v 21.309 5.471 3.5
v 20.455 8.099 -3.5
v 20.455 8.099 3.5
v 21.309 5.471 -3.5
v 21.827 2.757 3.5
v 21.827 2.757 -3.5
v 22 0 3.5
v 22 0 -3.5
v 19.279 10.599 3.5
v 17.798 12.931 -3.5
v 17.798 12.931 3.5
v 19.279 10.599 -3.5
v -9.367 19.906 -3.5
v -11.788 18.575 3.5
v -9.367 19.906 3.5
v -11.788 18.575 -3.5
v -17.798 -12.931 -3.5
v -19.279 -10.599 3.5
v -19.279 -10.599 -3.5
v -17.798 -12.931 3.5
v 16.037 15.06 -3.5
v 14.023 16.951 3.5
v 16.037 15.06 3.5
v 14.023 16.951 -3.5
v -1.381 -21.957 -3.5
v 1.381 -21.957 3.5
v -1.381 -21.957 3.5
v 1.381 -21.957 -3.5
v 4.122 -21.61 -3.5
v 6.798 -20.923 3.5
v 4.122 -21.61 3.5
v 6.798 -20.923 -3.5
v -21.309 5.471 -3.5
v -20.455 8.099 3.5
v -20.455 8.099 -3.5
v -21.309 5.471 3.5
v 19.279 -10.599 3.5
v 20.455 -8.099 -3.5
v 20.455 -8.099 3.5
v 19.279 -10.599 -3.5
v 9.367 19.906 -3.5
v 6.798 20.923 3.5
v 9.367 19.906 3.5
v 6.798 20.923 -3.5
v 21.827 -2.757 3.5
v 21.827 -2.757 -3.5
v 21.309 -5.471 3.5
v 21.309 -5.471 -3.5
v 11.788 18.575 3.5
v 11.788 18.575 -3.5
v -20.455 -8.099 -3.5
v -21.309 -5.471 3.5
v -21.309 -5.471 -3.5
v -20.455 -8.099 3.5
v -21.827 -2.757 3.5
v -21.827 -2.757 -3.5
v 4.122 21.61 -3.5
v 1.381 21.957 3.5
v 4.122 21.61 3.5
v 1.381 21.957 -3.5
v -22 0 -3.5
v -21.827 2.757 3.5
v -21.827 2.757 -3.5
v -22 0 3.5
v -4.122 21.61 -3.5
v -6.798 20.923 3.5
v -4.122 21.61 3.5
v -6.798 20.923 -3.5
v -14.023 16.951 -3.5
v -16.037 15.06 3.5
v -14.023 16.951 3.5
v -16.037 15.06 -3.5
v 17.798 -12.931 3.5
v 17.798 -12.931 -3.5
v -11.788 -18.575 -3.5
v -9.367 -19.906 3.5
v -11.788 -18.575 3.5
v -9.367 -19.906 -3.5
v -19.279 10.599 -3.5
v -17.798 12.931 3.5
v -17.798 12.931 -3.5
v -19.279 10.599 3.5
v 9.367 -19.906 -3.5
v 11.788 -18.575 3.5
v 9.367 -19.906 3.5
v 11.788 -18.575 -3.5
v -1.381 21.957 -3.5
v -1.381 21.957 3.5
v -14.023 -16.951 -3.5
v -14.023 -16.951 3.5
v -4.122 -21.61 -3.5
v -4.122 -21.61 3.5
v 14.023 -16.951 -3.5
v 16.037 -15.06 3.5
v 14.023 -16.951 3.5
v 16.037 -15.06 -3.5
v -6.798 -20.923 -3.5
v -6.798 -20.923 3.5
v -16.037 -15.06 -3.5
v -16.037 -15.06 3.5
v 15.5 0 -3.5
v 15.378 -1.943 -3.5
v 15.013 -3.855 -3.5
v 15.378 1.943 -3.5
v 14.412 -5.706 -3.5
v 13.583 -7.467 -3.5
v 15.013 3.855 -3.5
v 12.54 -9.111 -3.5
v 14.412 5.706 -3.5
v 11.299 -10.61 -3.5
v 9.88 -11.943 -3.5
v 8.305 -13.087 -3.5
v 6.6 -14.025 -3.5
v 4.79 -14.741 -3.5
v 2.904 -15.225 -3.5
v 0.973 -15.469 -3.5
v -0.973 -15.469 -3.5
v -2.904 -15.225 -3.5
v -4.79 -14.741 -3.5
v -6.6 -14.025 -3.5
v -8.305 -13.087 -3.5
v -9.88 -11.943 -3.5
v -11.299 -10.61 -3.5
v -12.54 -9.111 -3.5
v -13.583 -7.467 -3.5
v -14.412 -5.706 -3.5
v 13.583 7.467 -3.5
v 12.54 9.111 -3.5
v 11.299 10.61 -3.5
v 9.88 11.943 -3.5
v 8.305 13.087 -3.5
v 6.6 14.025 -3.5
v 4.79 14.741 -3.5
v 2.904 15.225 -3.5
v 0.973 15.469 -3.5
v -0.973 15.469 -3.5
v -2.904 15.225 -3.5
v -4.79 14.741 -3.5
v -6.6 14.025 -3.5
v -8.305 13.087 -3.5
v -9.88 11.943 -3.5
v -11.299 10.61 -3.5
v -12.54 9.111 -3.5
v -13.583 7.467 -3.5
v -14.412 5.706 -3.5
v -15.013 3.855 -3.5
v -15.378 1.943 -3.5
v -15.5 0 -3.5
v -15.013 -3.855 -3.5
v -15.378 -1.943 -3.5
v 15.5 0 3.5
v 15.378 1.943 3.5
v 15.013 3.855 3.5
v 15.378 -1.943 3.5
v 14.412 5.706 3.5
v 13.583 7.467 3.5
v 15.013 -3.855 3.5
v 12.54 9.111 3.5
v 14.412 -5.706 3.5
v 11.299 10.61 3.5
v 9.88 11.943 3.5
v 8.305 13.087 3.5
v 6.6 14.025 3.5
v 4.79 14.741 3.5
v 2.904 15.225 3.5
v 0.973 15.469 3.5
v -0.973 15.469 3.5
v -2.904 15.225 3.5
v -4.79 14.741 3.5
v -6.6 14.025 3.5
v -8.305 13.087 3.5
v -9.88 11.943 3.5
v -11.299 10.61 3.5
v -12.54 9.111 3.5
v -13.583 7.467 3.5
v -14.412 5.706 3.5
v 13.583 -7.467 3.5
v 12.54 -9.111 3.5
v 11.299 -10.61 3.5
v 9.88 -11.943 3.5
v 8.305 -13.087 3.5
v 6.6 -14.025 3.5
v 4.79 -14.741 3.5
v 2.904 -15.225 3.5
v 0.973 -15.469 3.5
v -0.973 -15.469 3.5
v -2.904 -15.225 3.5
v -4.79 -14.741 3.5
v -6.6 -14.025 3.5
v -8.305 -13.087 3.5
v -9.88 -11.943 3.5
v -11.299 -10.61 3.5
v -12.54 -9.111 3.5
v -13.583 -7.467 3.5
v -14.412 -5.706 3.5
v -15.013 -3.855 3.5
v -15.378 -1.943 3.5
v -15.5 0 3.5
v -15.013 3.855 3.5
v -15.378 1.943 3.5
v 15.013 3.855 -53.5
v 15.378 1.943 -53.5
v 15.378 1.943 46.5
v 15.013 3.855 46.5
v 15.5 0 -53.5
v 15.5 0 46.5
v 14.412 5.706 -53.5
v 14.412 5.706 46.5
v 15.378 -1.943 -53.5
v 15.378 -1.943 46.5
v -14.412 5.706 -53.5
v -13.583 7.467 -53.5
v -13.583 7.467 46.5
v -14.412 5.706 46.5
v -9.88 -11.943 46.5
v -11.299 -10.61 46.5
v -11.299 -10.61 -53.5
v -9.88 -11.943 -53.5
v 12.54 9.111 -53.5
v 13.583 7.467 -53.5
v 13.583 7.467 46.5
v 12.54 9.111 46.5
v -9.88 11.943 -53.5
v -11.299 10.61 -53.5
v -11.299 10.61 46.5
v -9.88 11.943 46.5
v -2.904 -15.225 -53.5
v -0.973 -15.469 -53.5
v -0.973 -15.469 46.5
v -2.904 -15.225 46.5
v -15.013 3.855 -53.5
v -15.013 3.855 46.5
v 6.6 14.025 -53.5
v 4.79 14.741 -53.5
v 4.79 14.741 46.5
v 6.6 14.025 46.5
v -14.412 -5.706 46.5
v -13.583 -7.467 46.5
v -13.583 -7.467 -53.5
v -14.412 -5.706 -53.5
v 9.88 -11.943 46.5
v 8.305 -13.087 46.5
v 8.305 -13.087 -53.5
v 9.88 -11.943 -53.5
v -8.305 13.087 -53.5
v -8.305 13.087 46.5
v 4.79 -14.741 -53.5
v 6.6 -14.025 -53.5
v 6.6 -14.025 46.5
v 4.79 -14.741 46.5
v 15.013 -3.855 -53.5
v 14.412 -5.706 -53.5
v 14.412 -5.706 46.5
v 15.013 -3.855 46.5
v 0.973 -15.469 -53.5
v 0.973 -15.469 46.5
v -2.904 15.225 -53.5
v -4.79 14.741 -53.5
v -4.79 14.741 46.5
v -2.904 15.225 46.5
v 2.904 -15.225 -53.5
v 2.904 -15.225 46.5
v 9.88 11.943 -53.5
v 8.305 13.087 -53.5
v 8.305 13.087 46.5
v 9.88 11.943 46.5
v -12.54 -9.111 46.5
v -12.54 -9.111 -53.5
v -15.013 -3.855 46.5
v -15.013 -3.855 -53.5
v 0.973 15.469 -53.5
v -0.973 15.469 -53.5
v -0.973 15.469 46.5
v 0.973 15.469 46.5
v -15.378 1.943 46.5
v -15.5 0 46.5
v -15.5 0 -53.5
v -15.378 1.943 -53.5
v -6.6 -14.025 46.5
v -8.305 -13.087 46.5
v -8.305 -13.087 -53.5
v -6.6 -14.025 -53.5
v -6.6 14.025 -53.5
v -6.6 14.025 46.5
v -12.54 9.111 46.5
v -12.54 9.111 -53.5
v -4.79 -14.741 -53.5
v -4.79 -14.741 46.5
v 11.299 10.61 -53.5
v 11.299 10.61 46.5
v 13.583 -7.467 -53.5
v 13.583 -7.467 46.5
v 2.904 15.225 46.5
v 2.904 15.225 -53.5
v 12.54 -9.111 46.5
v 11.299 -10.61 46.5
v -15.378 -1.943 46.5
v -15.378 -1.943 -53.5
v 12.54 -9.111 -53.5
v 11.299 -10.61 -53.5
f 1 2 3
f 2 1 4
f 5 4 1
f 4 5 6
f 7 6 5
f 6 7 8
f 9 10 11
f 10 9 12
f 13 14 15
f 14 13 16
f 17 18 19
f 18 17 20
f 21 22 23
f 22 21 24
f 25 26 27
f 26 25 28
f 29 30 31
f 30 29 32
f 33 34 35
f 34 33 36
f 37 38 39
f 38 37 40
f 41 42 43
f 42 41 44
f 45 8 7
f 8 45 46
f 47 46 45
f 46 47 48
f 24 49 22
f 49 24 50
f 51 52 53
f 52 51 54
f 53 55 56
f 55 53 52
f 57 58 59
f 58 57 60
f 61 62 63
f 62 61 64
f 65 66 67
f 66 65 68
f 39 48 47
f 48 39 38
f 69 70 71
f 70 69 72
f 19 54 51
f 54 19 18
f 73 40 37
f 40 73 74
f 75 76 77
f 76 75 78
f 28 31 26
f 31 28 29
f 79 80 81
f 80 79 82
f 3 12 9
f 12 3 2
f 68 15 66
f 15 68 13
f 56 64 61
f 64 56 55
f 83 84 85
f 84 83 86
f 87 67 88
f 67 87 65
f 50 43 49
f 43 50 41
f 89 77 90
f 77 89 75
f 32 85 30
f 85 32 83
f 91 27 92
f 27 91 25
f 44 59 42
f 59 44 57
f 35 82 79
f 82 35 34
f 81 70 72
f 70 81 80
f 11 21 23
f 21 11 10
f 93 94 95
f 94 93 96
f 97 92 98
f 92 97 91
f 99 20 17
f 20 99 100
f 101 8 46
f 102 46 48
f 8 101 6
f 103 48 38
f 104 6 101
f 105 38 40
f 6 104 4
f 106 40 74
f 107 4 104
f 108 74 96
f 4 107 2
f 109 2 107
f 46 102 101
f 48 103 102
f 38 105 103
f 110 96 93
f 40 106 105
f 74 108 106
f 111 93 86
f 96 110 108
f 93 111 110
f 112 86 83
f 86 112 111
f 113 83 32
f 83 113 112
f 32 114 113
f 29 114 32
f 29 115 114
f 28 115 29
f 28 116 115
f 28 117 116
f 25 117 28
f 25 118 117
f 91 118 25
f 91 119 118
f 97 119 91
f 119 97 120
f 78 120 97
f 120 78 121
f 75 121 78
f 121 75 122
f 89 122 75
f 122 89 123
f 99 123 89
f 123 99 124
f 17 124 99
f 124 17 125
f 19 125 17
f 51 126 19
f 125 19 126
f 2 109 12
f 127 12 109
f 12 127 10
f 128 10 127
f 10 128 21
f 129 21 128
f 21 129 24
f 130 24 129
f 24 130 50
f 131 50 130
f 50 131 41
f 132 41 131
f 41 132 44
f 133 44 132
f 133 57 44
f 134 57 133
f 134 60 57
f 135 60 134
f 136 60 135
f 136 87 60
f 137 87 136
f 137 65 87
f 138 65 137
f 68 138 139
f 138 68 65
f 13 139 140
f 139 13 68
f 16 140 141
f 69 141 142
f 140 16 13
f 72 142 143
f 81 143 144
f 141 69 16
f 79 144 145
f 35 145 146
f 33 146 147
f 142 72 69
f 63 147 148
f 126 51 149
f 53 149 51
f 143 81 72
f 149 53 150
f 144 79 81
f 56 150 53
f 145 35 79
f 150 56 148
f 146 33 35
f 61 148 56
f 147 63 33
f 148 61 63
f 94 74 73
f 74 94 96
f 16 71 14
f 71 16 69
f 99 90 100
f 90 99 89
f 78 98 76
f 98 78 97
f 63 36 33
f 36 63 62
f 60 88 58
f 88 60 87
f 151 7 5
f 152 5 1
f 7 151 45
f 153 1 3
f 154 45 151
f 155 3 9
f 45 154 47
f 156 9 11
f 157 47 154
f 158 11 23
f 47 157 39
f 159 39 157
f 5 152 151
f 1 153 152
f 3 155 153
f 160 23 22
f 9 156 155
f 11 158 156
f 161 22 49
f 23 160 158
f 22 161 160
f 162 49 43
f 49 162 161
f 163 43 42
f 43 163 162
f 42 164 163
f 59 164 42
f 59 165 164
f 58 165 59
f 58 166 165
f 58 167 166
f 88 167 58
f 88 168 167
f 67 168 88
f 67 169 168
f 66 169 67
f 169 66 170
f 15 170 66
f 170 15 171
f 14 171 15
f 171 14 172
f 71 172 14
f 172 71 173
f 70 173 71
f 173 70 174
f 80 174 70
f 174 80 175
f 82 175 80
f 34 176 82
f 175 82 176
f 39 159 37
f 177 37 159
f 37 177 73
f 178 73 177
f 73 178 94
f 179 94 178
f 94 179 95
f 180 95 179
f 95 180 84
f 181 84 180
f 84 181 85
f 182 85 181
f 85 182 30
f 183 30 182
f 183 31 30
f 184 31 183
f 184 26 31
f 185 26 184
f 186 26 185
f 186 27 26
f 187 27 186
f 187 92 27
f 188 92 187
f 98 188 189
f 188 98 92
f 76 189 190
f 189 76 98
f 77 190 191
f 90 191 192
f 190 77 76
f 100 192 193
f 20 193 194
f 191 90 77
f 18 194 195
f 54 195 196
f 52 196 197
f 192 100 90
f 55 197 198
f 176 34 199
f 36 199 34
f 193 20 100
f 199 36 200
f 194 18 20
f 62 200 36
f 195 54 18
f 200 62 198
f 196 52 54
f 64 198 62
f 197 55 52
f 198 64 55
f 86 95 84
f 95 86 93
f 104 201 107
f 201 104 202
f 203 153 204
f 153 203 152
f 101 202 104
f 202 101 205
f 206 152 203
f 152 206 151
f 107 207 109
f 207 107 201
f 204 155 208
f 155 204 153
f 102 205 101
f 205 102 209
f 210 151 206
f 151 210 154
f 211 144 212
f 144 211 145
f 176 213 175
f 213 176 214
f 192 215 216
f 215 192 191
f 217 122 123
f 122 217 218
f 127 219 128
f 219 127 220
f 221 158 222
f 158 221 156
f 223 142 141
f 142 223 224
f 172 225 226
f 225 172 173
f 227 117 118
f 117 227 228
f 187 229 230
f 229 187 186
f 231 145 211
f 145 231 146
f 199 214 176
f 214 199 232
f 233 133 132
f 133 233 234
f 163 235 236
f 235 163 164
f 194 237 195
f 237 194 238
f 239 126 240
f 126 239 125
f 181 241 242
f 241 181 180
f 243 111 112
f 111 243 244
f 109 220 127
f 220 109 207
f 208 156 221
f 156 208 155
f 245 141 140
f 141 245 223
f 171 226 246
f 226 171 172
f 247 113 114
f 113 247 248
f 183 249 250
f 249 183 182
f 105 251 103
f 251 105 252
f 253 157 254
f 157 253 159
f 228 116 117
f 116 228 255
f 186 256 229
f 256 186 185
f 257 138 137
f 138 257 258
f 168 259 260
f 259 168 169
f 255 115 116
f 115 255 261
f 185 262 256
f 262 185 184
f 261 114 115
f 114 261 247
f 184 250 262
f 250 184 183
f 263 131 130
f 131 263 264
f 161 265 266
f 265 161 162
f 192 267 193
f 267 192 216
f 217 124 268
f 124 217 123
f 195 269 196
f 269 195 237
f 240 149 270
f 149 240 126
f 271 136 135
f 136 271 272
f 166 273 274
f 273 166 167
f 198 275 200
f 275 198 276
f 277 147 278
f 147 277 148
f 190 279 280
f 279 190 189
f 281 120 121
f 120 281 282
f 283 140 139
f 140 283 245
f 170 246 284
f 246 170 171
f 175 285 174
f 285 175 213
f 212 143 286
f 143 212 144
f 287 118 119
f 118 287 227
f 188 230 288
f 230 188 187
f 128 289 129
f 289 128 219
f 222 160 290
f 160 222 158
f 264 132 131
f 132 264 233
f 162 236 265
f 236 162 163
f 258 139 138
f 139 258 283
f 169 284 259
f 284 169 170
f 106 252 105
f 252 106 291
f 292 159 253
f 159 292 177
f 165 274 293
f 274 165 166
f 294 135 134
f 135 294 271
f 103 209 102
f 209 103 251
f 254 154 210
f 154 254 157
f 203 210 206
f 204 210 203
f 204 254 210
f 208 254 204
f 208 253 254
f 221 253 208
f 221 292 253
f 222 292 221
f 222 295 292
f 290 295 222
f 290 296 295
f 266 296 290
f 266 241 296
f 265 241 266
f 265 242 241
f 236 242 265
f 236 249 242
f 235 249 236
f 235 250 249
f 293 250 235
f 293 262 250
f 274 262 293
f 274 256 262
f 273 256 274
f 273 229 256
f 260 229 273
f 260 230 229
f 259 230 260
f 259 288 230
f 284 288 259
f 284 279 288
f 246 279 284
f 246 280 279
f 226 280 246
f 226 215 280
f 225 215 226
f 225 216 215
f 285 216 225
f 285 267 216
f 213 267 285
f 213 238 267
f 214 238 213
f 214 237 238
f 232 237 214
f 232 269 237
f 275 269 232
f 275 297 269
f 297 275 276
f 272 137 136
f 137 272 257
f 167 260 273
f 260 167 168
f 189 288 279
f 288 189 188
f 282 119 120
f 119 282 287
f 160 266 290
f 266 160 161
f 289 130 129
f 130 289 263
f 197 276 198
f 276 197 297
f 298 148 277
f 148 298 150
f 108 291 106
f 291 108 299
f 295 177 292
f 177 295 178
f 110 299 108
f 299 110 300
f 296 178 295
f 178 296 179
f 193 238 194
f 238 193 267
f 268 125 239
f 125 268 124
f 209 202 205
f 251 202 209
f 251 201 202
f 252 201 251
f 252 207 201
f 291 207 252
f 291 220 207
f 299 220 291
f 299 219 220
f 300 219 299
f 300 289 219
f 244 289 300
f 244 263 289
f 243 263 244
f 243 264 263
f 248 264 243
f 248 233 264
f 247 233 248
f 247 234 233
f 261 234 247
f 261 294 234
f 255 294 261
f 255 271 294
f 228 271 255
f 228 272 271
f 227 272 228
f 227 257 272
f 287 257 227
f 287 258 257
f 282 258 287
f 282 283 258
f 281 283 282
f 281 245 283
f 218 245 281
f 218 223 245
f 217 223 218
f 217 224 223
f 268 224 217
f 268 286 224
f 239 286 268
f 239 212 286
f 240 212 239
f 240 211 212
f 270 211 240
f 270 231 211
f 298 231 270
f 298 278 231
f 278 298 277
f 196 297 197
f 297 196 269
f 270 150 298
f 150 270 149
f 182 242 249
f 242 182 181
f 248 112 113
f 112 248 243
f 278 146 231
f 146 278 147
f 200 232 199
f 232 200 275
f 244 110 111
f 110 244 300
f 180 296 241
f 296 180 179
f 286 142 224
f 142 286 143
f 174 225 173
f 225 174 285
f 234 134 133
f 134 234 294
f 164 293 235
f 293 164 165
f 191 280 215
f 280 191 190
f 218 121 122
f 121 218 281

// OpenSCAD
$fn = 50;

difference() {
	union() {
		translate(v = [0, 0, -3.5]) {
			union() {
				difference() {
					cylinder(h = 7, r = 22);
					cylinder(h = 7, r = 8);
				}
				difference() {
					translate(v = [0, 0, -50]) {
						cylinder(h = 100, r = 15.5);
					}
				}
			}
		}
	}
	union();
}
